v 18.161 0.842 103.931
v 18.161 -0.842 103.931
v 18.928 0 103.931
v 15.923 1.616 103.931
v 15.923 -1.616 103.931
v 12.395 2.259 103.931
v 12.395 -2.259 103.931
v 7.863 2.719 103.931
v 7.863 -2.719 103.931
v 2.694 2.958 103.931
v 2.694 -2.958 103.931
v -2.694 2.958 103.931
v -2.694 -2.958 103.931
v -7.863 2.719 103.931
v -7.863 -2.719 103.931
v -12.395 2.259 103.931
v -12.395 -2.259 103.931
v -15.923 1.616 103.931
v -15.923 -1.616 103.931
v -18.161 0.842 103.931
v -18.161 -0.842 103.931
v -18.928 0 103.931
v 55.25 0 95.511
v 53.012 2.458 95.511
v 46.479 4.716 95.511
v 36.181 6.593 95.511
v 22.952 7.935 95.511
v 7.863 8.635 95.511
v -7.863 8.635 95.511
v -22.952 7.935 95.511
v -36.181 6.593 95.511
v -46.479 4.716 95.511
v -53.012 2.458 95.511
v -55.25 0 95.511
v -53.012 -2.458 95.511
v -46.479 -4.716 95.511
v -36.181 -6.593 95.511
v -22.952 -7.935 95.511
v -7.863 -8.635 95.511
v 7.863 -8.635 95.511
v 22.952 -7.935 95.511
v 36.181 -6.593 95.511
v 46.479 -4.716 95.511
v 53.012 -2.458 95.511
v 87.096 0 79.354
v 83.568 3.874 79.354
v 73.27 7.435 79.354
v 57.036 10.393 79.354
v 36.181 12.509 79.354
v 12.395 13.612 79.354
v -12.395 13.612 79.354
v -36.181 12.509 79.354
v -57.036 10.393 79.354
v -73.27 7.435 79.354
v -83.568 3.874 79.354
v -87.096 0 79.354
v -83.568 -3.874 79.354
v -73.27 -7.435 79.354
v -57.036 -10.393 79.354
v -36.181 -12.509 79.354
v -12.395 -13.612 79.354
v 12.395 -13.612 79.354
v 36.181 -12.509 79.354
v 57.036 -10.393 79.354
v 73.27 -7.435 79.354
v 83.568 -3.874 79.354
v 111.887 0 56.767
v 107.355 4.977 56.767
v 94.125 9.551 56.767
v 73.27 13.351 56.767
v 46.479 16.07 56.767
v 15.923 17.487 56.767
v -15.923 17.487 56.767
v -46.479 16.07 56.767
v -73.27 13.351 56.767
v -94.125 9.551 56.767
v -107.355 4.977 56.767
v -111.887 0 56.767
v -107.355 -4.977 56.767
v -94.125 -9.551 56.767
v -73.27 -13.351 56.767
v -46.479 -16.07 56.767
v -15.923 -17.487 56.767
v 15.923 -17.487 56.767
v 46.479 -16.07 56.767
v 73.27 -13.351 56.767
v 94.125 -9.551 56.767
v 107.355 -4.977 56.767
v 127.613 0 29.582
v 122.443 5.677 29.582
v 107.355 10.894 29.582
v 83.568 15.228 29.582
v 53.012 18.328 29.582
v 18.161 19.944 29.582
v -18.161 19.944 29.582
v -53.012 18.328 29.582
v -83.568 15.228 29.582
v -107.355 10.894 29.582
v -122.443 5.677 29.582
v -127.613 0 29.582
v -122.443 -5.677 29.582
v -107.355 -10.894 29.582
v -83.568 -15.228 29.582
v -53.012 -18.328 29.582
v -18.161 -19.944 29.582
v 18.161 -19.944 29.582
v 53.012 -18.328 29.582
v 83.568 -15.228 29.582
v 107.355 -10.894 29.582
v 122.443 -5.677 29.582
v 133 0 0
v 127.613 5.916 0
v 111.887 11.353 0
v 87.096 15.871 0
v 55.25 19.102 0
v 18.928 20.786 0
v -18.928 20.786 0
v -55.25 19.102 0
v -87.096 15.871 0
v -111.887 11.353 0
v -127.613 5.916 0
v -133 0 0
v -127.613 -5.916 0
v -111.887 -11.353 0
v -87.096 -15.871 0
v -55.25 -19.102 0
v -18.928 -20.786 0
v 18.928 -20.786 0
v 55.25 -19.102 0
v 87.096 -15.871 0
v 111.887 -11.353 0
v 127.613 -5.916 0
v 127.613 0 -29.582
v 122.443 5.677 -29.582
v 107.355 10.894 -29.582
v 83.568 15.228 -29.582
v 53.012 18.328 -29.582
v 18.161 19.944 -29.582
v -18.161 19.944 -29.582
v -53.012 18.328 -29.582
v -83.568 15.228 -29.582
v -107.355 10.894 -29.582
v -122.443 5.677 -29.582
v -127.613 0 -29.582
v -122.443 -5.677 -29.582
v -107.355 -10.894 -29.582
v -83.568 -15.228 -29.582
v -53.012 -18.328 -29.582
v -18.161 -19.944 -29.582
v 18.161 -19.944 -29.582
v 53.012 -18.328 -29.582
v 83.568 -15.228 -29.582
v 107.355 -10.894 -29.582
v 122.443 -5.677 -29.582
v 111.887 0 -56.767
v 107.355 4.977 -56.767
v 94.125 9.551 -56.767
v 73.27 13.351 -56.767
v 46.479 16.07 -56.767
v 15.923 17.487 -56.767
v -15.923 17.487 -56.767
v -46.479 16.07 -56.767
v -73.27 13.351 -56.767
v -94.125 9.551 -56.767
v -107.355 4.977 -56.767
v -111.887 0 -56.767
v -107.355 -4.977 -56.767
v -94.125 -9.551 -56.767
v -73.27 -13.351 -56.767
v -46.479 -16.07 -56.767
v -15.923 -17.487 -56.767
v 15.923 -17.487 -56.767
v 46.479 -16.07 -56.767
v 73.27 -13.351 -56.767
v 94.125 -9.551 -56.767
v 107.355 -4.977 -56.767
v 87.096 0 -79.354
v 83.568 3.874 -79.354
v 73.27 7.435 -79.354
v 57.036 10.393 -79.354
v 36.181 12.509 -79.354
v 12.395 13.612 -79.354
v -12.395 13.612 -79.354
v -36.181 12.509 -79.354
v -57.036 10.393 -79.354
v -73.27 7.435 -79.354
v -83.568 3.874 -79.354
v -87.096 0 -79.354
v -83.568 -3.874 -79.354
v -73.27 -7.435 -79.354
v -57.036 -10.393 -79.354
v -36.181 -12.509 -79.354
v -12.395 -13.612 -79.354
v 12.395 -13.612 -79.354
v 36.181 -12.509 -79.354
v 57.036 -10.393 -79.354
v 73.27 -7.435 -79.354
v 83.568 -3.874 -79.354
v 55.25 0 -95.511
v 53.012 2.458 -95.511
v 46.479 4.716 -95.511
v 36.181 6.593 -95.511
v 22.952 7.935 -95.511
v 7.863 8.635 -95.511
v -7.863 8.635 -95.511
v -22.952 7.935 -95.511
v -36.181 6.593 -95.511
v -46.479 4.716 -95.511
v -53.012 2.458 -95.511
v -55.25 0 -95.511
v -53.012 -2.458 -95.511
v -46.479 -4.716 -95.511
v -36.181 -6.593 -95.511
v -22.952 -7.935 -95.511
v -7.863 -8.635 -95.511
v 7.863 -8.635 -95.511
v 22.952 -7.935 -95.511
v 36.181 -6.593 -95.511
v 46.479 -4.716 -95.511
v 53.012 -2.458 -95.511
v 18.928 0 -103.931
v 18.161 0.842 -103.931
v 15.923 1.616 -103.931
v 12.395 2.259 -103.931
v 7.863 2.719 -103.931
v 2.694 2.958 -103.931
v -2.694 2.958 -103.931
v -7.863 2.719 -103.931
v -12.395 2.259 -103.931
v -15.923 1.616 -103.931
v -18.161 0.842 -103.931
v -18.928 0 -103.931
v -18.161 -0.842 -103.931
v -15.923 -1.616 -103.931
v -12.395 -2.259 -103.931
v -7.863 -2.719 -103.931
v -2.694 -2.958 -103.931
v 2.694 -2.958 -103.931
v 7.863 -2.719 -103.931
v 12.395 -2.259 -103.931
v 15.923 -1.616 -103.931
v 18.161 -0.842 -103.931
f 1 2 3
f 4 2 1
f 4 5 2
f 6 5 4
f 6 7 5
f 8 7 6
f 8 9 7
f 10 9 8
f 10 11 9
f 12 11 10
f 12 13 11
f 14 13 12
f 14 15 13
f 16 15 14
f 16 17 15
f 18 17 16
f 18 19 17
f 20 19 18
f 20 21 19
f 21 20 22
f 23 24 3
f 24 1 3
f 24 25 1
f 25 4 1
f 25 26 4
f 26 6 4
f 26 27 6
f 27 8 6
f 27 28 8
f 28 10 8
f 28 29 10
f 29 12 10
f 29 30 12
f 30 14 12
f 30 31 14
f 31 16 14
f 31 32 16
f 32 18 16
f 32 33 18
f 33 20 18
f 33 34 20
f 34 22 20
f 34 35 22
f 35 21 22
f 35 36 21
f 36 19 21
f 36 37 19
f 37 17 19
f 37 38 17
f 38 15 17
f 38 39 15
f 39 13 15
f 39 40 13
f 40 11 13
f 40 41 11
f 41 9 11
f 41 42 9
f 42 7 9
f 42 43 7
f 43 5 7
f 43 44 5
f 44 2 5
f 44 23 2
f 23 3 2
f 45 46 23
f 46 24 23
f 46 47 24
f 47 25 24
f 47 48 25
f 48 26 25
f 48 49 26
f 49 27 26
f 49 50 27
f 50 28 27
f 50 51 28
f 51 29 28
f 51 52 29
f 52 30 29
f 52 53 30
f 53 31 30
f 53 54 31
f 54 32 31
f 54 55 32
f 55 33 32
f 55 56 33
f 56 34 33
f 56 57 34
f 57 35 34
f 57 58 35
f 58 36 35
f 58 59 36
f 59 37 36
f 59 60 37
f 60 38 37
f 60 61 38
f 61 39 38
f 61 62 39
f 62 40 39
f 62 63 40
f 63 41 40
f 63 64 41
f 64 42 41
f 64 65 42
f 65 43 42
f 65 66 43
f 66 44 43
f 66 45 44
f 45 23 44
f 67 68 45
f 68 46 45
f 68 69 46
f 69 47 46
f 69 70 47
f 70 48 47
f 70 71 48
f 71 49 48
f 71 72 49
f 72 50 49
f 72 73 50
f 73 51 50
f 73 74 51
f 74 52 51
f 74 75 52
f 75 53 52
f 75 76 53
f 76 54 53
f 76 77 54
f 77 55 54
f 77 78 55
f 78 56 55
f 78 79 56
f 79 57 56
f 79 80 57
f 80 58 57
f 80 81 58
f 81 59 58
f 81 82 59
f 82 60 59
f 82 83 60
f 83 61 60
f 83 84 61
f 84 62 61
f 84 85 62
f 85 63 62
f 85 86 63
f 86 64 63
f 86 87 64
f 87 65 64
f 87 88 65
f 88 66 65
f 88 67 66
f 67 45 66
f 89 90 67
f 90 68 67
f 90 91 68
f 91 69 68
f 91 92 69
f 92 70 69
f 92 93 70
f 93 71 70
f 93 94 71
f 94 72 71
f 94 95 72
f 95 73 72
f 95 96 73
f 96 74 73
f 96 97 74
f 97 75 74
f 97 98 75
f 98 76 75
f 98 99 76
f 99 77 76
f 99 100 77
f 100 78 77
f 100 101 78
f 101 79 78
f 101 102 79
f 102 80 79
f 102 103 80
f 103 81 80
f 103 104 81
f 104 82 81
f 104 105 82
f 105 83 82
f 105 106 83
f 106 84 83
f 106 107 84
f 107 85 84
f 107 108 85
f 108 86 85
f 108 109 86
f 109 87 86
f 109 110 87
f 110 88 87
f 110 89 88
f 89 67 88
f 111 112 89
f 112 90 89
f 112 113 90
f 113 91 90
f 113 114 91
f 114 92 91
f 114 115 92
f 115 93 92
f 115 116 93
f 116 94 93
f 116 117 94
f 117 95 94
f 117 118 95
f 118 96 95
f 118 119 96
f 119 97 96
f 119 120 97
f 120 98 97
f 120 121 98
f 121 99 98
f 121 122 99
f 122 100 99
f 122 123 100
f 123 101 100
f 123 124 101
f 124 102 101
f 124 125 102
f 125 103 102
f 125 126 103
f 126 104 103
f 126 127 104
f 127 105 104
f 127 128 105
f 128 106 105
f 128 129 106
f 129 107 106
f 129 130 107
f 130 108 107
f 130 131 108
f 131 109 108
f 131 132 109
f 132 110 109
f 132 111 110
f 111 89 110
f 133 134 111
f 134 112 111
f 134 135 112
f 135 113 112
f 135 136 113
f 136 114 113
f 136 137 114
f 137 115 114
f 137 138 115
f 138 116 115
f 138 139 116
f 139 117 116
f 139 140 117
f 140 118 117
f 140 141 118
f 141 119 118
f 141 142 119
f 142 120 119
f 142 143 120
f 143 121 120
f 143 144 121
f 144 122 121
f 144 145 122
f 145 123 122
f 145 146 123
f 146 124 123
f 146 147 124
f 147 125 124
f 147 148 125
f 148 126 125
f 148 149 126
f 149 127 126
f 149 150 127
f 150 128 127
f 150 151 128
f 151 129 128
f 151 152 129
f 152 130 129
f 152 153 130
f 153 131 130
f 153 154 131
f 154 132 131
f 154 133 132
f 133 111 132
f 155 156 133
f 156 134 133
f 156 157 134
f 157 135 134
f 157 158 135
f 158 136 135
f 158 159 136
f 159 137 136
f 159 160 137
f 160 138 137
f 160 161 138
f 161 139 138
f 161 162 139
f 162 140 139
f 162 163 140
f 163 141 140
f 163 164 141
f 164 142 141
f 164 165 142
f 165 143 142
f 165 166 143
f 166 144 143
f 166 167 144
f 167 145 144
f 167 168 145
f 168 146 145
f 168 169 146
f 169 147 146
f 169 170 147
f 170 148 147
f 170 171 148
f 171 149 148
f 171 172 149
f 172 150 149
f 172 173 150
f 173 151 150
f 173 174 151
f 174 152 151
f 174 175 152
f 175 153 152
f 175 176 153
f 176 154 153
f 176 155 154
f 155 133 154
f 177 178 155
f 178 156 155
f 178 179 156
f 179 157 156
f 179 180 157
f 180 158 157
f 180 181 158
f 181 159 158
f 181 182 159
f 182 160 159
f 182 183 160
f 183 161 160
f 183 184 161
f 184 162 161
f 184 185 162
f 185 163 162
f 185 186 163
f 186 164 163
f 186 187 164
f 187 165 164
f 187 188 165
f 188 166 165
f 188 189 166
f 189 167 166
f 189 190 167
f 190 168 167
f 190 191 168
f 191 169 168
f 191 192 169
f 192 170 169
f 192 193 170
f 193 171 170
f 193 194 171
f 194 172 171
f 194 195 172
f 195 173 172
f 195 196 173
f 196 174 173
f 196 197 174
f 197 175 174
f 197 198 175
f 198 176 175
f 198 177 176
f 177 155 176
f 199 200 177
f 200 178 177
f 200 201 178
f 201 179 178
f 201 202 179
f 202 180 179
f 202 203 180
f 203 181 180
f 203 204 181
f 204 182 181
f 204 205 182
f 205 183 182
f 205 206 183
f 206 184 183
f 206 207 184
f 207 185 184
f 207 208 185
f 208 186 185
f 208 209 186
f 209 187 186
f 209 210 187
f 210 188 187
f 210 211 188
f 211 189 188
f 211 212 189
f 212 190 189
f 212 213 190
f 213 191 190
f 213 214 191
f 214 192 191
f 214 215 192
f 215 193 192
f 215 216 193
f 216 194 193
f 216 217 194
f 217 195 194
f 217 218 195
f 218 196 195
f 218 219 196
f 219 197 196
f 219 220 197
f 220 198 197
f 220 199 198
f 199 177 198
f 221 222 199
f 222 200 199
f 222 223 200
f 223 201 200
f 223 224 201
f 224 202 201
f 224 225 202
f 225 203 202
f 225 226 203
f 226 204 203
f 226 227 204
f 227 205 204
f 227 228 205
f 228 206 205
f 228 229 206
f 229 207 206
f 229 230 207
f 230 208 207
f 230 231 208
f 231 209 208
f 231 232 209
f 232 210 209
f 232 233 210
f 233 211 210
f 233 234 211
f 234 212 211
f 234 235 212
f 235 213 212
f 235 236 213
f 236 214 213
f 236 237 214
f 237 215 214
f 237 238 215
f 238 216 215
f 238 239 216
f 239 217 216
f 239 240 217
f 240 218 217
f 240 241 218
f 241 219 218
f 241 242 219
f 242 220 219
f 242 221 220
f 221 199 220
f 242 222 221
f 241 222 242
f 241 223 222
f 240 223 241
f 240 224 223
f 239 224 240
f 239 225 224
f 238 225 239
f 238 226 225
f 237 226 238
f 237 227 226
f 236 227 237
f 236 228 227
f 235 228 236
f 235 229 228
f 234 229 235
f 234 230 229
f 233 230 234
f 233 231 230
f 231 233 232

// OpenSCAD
// Generated by SolidPython 1.0.1 on 2020-07-29 00:46:53


scale(v = [19, 3, 15]) {
	sphere(r = 7);
}
/***********************************************
*********      SolidPython code:      **********
************************************************
 
# import packages: SolidPython
from solid import *
from solid.utils import *
from itertools import chain, combinations, permutations


class Resize:

    def __init__(self, scad_file):
        self.scad_file = scad_file
        #self.scad_file = import_scad(scad_file)
        # cone/cylinder param:
        self.r1 = 0
        self.r2 = 0
        self.h = 0
        # rectangular prism param:
        self.w = 0
        self.l = 0
        # ellipse param:
        self.r = 0

    # import OpenScad code (file name corresponds to shape)


    # classify shape + parameters
    def assign(self, param1, param2, param3):
        if self.scad_file == 'cone.scad':
            self.r1 = param1
            self.r2 = param2
            self.h = param3
        elif self.scad_file == 'cylinder.scad':
            self.r1 = param1
            self.r2 = param2
            self.h = param3
        elif self.scad_file == 'rectangularPrism.scad':
            self.h = param1
            self.l = param2
            self.w = param3
        else:
            self.r = param1
            self.h = param2

    # resize parameters
    def iterate(self):
        x = range(3, 20, 2)
        i = 1
        if self.scad_file == 'cone.scad':
            tempList = list(permutations(x, 2))
            for temp in tempList:
                param1 = temp[0]
                param2 = temp[1]
                filepath = 'produced_scad_files/' + 'cone' + str(param1) + '_' + str(param2) + '_' + '.scad'
                scad_render_to_file(cylinder(h=param1, r1=param2, r2=0), filepath)

        elif self.scad_file == 'cylinder.scad':
            tempList = list(permutations(x, 3))
            for temp in tempList:
                param1 = temp[0]
                param2 = temp[1]
                filepath = 'produced_scad_files/' + 'cylinder' + str(param1) + '_' + str(param2) + '_' + '.scad'
                scad_render_to_file(cylinder(h=param1, r1=param2, r2=param2), filepath)

        elif self.scad_file == 'rectangularPrism.scad':
            tempList = list(permutations(x, 3))
            for temp in tempList:
                param1 = temp[0]
                param2 = temp[1]
                param3 = temp[2]
                filepath = 'produced_scad_files/' + 'rectangularPrism' + str(param1) + '_' + str(param2) + '_' + str(
                    param3) + '.scad'
                scad_render_to_file(cube(size=(param1, param2, param3)), filepath)

        elif self.scad_file == 'ellipse.scad':
            tempList = list(permutations(x, 4))
            for temp in tempList:
                param1 = temp[0]
                param2 = temp[1]
                param3 = temp[2]
                param4 = temp[3]
                filepath = 'produced_scad_files/' + 'ellipse' + str(param1) + '_' + str(param2) + '_' + str(param3) + '_' + str(param4) + '.scad'
                scad_render_to_file(scale([param1, param2, param3])(sphere(r=param4)), filepath)

    def render_to_scadfile(self):
        scad_render_to_file(scad, 'example.scad') 
 
************************************************/
